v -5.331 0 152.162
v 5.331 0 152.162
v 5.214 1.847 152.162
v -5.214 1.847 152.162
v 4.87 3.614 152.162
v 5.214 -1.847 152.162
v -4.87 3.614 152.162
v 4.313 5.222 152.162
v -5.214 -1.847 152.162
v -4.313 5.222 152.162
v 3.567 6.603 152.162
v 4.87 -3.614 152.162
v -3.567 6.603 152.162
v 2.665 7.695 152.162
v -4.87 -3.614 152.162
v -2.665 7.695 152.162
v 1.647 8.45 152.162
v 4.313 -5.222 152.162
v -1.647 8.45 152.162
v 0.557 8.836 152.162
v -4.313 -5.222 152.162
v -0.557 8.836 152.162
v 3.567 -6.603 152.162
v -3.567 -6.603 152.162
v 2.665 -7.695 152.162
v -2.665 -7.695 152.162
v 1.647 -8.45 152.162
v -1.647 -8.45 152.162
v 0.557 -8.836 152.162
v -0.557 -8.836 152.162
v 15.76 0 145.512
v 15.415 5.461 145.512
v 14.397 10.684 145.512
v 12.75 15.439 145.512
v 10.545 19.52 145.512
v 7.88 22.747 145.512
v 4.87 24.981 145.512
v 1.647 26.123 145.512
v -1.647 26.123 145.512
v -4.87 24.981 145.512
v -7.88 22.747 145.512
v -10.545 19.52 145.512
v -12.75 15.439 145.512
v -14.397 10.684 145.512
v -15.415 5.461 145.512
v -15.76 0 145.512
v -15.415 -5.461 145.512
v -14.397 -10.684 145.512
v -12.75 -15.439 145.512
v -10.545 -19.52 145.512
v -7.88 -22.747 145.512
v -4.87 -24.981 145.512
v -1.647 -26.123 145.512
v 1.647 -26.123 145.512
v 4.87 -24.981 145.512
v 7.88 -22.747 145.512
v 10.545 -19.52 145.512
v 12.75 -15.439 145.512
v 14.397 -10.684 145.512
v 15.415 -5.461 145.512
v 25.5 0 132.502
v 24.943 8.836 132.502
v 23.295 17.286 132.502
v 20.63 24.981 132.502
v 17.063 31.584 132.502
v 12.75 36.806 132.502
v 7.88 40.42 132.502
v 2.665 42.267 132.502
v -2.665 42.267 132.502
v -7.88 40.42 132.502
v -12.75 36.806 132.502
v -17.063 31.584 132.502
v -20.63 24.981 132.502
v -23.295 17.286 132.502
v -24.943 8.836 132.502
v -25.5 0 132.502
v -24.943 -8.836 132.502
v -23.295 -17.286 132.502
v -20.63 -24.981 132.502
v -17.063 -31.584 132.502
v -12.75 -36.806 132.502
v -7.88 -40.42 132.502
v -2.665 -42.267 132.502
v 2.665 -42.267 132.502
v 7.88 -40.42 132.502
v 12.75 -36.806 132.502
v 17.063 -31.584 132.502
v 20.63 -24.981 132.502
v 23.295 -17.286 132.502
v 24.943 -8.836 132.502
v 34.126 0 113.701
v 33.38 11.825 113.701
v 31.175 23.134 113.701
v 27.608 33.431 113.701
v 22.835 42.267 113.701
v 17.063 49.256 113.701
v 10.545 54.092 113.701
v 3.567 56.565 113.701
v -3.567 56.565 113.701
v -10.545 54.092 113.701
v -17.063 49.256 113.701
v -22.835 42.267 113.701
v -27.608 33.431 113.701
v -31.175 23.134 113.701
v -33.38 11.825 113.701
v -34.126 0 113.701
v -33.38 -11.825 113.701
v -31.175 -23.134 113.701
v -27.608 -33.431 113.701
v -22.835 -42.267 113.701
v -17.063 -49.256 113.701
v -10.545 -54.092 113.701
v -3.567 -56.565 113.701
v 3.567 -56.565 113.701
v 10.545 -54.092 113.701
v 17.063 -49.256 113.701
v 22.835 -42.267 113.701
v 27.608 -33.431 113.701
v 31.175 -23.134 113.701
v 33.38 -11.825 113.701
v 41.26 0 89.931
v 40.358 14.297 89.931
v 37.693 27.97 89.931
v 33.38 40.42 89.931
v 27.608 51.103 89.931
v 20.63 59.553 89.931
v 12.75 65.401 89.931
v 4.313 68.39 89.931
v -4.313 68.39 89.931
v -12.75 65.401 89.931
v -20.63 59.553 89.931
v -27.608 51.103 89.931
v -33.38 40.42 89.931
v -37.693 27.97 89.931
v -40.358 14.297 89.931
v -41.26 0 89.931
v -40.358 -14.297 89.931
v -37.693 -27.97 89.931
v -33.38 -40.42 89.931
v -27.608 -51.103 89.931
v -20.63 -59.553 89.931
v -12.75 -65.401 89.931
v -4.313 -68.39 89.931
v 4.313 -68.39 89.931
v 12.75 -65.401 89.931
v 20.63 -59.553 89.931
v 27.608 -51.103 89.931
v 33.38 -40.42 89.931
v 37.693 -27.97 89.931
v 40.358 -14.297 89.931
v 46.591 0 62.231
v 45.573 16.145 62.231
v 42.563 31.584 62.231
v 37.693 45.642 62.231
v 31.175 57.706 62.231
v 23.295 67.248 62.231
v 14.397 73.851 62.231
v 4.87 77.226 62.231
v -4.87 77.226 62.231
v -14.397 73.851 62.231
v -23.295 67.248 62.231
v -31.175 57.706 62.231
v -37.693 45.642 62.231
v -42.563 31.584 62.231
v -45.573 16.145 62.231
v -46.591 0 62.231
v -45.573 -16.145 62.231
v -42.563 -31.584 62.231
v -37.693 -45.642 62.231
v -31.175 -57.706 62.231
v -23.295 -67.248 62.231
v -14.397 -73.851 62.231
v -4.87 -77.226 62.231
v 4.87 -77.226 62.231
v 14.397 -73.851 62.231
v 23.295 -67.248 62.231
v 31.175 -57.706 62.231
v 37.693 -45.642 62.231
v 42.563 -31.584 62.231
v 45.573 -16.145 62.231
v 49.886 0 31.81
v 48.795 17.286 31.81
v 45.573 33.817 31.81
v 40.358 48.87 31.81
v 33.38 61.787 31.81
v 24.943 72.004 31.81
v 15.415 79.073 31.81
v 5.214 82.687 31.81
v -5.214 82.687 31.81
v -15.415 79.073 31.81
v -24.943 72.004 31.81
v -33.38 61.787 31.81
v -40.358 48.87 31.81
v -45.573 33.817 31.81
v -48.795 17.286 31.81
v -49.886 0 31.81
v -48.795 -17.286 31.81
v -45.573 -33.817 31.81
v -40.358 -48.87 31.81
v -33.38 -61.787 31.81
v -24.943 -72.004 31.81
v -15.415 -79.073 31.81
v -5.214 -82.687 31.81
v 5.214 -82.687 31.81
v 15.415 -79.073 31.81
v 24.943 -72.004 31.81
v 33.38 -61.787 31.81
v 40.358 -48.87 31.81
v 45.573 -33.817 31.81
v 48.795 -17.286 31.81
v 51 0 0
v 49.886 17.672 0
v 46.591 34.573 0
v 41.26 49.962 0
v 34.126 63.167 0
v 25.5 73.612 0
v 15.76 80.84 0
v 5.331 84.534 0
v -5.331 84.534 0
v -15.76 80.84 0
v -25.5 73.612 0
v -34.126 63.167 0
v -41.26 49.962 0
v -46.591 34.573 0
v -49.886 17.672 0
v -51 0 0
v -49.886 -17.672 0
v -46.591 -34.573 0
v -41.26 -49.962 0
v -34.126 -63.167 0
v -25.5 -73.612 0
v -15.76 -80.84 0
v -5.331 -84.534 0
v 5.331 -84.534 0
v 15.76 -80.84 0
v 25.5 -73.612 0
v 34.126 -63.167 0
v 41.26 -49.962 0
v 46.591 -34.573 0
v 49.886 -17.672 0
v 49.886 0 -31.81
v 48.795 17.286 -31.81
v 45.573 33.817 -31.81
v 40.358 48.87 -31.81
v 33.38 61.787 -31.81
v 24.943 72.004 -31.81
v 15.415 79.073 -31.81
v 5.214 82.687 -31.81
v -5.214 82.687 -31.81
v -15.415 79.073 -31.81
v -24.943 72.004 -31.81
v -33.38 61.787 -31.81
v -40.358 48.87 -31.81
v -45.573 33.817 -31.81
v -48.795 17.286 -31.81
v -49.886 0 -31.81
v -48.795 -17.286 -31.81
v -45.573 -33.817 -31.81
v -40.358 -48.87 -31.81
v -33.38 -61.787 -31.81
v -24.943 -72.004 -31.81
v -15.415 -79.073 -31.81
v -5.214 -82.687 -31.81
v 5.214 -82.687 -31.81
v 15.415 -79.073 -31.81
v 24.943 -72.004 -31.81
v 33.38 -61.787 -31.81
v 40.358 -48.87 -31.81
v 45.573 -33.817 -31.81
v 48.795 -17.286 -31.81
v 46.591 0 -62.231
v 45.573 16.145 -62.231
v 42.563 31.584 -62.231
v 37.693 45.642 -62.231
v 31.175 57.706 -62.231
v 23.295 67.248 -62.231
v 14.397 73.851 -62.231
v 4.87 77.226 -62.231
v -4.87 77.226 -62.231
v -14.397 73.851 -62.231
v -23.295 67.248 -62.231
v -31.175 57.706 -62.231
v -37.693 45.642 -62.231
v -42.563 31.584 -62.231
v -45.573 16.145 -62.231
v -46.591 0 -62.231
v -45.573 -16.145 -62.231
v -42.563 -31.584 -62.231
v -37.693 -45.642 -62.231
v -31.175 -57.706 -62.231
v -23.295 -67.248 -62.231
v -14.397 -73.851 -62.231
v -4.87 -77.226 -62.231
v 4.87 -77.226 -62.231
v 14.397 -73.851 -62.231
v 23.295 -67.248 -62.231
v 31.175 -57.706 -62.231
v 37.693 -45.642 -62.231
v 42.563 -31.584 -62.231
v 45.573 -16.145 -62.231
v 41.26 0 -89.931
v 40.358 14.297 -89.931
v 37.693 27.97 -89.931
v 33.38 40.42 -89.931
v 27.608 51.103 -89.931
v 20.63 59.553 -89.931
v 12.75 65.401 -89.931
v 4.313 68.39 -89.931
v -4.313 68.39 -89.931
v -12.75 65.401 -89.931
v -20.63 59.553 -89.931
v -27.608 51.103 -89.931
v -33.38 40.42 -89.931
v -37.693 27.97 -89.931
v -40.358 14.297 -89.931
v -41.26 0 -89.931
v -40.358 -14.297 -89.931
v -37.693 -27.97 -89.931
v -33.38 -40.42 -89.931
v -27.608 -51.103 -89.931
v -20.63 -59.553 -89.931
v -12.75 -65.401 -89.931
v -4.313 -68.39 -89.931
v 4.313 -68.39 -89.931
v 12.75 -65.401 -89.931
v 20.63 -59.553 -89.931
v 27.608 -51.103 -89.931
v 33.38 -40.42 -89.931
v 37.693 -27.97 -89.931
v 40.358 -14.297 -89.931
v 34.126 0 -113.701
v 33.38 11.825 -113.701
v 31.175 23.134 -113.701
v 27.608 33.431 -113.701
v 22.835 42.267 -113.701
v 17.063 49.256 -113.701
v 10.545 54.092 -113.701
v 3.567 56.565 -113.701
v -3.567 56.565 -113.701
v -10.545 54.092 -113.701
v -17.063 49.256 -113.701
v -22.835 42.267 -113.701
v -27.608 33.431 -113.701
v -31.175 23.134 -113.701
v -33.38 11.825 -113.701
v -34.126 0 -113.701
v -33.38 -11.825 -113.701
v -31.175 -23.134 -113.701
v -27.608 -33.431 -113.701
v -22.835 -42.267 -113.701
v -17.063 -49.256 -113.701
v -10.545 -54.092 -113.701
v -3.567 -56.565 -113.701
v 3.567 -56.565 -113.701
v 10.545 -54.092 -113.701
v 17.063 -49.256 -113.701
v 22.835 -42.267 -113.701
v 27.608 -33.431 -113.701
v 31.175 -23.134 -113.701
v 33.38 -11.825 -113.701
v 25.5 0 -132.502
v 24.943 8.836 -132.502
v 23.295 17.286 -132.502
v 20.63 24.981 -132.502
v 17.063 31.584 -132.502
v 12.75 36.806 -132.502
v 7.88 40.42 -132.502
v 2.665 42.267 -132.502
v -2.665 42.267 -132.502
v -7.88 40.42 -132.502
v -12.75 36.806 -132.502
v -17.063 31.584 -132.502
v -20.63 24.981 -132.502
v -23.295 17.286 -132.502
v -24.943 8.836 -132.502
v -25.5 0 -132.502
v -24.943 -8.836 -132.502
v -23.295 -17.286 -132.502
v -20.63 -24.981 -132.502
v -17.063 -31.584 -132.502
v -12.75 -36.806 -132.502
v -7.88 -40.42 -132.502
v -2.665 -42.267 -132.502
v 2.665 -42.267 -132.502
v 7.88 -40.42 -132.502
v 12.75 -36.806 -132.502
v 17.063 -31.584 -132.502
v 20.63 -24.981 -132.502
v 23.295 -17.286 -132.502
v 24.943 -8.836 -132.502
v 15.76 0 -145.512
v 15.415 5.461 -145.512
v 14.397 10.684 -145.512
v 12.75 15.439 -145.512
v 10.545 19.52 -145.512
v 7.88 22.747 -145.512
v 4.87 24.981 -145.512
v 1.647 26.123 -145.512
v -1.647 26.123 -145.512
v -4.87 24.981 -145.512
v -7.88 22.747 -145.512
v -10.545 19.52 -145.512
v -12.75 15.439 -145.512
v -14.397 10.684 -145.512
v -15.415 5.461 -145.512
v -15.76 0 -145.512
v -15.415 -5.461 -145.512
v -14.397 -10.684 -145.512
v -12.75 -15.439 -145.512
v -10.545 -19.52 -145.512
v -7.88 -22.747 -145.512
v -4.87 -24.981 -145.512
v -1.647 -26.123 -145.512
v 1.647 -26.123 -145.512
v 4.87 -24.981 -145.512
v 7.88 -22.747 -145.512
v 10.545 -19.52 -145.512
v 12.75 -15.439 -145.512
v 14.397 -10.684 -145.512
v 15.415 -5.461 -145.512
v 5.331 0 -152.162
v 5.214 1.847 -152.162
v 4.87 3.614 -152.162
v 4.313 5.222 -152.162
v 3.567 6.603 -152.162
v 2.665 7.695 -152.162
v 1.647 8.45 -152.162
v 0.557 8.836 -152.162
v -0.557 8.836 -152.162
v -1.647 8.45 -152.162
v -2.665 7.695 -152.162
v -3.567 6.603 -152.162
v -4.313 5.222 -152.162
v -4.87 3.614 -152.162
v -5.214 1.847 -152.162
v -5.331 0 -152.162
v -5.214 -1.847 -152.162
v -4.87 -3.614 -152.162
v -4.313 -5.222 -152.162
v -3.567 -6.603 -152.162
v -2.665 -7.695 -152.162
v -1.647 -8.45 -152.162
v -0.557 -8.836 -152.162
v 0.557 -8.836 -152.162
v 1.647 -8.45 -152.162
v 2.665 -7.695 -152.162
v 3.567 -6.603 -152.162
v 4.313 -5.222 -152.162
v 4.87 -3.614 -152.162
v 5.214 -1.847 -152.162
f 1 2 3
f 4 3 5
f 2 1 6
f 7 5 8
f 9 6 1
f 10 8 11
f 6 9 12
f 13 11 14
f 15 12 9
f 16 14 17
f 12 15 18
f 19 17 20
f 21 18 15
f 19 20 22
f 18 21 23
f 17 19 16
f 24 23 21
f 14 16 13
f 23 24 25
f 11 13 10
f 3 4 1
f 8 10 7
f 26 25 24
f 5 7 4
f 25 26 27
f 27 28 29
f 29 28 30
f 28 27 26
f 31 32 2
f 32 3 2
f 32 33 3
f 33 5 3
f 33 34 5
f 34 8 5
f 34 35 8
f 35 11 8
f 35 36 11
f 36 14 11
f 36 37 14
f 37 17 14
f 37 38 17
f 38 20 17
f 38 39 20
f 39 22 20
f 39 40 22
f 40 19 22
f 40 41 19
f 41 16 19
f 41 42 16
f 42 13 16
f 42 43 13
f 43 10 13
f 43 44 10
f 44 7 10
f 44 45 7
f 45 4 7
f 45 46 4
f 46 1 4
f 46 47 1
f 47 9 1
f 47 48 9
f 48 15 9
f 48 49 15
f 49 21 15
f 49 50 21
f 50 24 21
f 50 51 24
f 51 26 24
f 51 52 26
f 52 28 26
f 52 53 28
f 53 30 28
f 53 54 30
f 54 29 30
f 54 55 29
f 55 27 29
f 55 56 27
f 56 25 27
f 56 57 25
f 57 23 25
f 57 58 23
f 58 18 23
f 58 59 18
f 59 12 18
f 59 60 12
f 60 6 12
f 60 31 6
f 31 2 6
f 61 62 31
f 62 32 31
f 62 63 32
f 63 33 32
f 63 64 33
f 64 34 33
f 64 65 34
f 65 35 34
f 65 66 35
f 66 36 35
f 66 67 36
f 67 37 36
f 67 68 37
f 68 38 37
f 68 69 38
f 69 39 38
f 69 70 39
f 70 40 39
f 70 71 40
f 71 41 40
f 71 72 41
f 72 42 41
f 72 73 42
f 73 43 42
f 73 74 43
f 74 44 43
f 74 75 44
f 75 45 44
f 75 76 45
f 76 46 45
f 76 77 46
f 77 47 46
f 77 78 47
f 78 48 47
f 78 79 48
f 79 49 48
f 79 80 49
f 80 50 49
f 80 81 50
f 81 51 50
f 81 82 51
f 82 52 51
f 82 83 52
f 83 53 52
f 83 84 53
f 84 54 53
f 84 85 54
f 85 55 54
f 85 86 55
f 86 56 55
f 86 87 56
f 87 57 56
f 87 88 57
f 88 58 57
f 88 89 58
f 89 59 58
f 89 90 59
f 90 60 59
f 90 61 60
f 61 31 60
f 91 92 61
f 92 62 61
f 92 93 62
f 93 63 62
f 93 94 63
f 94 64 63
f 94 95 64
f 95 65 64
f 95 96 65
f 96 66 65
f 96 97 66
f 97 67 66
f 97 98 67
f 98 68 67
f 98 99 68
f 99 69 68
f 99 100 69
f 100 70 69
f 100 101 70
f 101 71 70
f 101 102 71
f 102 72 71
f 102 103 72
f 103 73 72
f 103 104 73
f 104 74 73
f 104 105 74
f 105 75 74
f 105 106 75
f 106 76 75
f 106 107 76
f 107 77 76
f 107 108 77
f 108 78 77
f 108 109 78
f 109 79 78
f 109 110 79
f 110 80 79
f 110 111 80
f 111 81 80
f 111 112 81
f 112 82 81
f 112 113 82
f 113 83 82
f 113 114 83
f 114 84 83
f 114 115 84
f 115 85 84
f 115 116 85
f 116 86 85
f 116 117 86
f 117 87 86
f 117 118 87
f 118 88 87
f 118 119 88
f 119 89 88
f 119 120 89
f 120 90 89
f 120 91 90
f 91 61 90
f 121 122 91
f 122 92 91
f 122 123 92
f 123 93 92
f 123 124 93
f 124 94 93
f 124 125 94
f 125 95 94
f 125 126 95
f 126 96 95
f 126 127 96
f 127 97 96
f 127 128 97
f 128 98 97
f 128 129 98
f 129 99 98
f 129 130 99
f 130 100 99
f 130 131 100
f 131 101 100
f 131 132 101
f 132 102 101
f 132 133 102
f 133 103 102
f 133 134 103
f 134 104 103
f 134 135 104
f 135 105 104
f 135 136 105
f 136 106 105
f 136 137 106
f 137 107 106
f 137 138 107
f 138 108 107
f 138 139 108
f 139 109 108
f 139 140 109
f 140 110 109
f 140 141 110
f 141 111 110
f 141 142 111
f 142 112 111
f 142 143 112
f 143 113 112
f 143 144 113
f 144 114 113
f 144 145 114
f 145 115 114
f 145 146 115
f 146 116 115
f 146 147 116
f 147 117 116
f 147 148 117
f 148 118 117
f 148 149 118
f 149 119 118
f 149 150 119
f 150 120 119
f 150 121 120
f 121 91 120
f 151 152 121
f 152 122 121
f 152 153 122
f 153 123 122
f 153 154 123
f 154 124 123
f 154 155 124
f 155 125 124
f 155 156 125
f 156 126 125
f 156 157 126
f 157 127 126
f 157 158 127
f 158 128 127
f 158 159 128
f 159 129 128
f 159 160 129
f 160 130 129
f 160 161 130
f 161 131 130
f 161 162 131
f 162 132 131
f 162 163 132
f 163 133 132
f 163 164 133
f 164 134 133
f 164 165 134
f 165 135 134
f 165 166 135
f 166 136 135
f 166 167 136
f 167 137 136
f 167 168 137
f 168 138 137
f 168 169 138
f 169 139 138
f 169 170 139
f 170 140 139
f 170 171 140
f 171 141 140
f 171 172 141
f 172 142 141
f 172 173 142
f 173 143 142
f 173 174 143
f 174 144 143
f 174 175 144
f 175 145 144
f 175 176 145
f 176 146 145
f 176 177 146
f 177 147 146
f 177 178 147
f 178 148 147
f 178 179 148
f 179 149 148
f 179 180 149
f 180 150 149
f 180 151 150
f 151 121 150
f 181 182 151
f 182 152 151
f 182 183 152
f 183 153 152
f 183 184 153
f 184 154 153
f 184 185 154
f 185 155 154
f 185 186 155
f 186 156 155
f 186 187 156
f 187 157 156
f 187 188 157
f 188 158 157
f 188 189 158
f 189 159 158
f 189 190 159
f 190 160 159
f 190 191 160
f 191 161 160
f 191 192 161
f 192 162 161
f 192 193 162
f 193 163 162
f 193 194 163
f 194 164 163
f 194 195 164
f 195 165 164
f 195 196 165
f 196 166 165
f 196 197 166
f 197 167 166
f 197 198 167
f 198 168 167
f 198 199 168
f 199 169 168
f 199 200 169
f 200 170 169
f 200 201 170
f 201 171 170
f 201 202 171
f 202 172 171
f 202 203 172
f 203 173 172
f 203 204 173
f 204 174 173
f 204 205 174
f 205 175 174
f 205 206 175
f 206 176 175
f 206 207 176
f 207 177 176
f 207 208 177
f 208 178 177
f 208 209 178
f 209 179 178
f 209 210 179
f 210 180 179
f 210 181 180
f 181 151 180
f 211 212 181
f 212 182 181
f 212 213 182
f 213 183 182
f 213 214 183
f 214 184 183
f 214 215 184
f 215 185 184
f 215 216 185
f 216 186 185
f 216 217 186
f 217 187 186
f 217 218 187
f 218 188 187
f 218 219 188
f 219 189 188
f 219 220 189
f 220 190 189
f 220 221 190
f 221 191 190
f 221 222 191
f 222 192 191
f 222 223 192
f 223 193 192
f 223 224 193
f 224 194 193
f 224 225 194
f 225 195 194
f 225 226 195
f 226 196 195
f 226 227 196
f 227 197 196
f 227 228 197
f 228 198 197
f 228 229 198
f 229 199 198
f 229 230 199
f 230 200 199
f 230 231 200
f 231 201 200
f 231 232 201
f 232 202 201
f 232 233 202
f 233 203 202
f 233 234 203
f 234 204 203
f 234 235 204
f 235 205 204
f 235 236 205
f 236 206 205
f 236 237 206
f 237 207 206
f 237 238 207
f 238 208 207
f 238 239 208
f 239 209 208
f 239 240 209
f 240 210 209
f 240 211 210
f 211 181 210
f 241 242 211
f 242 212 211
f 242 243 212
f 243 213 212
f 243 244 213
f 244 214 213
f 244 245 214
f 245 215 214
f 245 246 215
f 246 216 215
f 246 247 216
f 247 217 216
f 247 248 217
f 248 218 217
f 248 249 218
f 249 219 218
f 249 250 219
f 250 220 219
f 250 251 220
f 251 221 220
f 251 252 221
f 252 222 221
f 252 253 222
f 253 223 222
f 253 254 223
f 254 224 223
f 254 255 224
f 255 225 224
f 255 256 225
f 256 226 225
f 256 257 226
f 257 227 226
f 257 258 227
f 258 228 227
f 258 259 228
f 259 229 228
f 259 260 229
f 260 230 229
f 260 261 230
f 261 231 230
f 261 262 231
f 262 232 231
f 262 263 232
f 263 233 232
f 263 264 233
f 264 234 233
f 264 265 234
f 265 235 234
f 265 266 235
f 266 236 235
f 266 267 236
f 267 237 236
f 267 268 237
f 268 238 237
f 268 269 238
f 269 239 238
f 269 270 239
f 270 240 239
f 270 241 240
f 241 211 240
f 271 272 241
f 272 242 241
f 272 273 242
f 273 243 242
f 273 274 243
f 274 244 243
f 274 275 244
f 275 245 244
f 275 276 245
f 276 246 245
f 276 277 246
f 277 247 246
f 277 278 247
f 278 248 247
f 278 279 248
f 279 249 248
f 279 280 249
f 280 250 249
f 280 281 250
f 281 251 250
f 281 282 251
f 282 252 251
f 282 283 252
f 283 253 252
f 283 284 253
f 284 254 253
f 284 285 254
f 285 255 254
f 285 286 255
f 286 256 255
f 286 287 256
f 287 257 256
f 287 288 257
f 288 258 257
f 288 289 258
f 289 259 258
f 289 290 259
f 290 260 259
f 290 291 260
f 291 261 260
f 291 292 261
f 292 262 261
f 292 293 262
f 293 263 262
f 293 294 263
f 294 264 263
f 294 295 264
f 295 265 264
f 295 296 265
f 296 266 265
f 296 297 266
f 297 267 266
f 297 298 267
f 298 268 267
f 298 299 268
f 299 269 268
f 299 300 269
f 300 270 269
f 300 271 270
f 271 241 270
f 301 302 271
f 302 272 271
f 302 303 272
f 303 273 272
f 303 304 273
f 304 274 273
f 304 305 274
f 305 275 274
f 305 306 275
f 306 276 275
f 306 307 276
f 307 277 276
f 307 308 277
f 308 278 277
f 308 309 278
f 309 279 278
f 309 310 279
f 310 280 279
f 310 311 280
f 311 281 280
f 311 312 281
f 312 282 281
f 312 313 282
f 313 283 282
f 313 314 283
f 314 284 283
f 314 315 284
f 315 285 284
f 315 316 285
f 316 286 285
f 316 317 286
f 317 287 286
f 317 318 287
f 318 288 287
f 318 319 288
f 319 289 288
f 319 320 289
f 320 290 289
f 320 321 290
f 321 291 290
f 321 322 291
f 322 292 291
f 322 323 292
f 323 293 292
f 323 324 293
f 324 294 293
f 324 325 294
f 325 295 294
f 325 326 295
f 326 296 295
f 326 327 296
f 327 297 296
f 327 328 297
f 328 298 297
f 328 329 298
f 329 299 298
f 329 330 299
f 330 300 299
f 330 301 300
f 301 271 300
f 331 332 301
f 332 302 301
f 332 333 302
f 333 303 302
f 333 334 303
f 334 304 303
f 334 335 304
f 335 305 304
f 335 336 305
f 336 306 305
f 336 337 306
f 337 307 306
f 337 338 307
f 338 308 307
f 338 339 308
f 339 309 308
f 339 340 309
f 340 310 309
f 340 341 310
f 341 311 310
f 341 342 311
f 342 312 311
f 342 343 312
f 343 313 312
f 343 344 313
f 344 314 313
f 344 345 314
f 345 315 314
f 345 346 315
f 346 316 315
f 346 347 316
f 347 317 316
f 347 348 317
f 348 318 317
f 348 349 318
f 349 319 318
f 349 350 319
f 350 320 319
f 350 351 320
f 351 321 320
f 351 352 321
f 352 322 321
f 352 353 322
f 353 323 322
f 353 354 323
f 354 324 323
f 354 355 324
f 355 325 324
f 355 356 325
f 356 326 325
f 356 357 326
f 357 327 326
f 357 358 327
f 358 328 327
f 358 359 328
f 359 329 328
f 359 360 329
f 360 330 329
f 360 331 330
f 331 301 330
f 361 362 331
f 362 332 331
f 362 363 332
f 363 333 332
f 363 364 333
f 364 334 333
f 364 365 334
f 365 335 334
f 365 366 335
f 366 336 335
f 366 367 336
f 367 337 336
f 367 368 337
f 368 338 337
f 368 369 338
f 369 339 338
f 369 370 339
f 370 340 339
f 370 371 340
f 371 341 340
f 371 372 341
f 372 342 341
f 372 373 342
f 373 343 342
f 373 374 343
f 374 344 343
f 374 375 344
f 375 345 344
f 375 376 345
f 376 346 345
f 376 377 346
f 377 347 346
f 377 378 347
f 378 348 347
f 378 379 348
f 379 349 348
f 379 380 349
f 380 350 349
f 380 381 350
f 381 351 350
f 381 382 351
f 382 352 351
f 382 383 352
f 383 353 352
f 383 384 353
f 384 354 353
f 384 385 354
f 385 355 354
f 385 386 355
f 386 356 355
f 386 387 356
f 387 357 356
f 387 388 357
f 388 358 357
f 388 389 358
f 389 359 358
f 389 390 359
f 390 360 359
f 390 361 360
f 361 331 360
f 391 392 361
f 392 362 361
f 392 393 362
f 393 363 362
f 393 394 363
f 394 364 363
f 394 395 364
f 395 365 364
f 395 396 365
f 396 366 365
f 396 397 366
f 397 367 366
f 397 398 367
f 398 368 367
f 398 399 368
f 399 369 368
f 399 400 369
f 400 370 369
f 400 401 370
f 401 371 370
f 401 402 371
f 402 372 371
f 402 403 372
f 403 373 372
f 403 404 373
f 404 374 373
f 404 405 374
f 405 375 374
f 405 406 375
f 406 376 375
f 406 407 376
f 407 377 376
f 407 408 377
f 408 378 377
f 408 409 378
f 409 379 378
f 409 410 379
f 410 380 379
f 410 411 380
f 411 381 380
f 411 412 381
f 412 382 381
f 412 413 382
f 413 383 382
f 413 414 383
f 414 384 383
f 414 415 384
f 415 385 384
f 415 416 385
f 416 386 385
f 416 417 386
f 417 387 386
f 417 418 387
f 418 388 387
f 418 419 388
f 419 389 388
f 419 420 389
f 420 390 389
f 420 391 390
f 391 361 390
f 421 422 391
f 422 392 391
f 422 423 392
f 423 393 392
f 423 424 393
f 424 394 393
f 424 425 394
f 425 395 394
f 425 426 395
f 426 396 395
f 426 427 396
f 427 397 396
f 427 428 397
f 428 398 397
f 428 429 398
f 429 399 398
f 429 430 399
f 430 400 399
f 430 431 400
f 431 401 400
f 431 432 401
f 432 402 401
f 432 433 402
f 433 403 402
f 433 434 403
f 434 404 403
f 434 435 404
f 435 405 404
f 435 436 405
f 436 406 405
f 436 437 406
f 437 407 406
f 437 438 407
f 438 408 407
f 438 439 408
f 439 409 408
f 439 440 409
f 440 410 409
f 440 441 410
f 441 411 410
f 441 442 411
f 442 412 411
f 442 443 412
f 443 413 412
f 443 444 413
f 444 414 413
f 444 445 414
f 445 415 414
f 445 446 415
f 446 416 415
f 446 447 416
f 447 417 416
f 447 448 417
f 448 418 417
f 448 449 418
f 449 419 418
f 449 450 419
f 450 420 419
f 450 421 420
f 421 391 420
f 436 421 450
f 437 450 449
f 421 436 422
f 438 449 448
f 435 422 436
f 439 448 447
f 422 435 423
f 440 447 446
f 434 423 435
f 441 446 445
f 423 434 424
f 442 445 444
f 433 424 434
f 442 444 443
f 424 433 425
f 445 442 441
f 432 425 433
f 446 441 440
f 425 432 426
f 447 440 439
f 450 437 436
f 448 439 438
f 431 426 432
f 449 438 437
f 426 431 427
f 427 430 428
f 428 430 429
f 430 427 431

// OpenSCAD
// Generated by SolidPython 1.0.1 on 2020-07-29 00:39:25


scale(v = [3, 5, 9]) {
	sphere(r = 17);
}
/***********************************************
*********      SolidPython code:      **********
************************************************
 
# import packages: SolidPython
from solid import *
from solid.utils import *
from itertools import chain, combinations


class Resize:

    def __init__(self, scad_file):
        self.scad_file = scad_file
        #self.scad_file = import_scad(scad_file)
        # cone/cylinder param:
        self.r1 = 0
        self.r2 = 0
        self.h = 0
        # rectangular prism param:
        self.w = 0
        self.l = 0
        # ellipse param:
        self.r = 0

    # import OpenScad code (file name corresponds to shape)


    # classify shape + parameters
    def assign(self, param1, param2, param3):
        if self.scad_file == 'cone.scad':
            self.r1 = param1
            self.r2 = param2
            self.h = param3
        elif self.scad_file == 'cylinder.scad':
            self.r1 = param1
            self.r2 = param2
            self.h = param3
        elif self.scad_file == 'rectangularPrism.scad':
            self.h = param1
            self.l = param2
            self.w = param3
        else:
            self.r = param1
            self.h = param2

    # resize parameters
    def iterate(self):
        x = range(3, 20, 2)
        i = 1
        if self.scad_file == 'cone.scad':
            tempList = list(combinations(x, 2))
            for temp in tempList:
                param1 = temp[0]
                param2 = temp[1]
                filepath = 'produced_scad_files/' + 'cone' + str(param1) + '_' + str(param2) + '_' + '.scad'
                scad_render_to_file(cylinder(h=param1, r1=param2, r2=0), filepath)

        elif self.scad_file == 'cylinder.scad':
            tempList = list(combinations(x, 3))
            for temp in tempList:
                param1 = temp[0]
                param2 = temp[1]
                filepath = 'produced_scad_files/' + 'cylinder' + str(param1) + '_' + str(param2) + '_' + '.scad'
                scad_render_to_file(cylinder(h=param1, r1=param2, r2=param2), filepath)

        elif self.scad_file == 'rectangularPrism.scad':
            tempList = list(combinations(x, 3))
            for temp in tempList:
                param1 = temp[0]
                param2 = temp[1]
                param3 = temp[2]
                filepath = 'produced_scad_files/' + 'rectangularPrism' + str(param1) + '_' + str(param2) + '_' + str(
                    param3) + '.scad'
                scad_render_to_file(cube(size=(param1, param2, param3)), filepath)

        elif self.scad_file == 'ellipse.scad':
            tempList = list(combinations(x, 4))
            for temp in tempList:
                param1 = temp[0]
                param2 = temp[1]
                param3 = temp[2]
                param4 = temp[3]
                filepath = 'produced_scad_files/' + 'ellipse' + str(param1) + '_' + str(param2) + '_' + str(param3) + '_' + str(param4) + '.scad'
                scad_render_to_file(scale([param1, param2, param3])(sphere(r=param4)), filepath)

    def render_to_scadfile(self):
        scad_render_to_file(scad, 'example.scad') 
 
************************************************/
